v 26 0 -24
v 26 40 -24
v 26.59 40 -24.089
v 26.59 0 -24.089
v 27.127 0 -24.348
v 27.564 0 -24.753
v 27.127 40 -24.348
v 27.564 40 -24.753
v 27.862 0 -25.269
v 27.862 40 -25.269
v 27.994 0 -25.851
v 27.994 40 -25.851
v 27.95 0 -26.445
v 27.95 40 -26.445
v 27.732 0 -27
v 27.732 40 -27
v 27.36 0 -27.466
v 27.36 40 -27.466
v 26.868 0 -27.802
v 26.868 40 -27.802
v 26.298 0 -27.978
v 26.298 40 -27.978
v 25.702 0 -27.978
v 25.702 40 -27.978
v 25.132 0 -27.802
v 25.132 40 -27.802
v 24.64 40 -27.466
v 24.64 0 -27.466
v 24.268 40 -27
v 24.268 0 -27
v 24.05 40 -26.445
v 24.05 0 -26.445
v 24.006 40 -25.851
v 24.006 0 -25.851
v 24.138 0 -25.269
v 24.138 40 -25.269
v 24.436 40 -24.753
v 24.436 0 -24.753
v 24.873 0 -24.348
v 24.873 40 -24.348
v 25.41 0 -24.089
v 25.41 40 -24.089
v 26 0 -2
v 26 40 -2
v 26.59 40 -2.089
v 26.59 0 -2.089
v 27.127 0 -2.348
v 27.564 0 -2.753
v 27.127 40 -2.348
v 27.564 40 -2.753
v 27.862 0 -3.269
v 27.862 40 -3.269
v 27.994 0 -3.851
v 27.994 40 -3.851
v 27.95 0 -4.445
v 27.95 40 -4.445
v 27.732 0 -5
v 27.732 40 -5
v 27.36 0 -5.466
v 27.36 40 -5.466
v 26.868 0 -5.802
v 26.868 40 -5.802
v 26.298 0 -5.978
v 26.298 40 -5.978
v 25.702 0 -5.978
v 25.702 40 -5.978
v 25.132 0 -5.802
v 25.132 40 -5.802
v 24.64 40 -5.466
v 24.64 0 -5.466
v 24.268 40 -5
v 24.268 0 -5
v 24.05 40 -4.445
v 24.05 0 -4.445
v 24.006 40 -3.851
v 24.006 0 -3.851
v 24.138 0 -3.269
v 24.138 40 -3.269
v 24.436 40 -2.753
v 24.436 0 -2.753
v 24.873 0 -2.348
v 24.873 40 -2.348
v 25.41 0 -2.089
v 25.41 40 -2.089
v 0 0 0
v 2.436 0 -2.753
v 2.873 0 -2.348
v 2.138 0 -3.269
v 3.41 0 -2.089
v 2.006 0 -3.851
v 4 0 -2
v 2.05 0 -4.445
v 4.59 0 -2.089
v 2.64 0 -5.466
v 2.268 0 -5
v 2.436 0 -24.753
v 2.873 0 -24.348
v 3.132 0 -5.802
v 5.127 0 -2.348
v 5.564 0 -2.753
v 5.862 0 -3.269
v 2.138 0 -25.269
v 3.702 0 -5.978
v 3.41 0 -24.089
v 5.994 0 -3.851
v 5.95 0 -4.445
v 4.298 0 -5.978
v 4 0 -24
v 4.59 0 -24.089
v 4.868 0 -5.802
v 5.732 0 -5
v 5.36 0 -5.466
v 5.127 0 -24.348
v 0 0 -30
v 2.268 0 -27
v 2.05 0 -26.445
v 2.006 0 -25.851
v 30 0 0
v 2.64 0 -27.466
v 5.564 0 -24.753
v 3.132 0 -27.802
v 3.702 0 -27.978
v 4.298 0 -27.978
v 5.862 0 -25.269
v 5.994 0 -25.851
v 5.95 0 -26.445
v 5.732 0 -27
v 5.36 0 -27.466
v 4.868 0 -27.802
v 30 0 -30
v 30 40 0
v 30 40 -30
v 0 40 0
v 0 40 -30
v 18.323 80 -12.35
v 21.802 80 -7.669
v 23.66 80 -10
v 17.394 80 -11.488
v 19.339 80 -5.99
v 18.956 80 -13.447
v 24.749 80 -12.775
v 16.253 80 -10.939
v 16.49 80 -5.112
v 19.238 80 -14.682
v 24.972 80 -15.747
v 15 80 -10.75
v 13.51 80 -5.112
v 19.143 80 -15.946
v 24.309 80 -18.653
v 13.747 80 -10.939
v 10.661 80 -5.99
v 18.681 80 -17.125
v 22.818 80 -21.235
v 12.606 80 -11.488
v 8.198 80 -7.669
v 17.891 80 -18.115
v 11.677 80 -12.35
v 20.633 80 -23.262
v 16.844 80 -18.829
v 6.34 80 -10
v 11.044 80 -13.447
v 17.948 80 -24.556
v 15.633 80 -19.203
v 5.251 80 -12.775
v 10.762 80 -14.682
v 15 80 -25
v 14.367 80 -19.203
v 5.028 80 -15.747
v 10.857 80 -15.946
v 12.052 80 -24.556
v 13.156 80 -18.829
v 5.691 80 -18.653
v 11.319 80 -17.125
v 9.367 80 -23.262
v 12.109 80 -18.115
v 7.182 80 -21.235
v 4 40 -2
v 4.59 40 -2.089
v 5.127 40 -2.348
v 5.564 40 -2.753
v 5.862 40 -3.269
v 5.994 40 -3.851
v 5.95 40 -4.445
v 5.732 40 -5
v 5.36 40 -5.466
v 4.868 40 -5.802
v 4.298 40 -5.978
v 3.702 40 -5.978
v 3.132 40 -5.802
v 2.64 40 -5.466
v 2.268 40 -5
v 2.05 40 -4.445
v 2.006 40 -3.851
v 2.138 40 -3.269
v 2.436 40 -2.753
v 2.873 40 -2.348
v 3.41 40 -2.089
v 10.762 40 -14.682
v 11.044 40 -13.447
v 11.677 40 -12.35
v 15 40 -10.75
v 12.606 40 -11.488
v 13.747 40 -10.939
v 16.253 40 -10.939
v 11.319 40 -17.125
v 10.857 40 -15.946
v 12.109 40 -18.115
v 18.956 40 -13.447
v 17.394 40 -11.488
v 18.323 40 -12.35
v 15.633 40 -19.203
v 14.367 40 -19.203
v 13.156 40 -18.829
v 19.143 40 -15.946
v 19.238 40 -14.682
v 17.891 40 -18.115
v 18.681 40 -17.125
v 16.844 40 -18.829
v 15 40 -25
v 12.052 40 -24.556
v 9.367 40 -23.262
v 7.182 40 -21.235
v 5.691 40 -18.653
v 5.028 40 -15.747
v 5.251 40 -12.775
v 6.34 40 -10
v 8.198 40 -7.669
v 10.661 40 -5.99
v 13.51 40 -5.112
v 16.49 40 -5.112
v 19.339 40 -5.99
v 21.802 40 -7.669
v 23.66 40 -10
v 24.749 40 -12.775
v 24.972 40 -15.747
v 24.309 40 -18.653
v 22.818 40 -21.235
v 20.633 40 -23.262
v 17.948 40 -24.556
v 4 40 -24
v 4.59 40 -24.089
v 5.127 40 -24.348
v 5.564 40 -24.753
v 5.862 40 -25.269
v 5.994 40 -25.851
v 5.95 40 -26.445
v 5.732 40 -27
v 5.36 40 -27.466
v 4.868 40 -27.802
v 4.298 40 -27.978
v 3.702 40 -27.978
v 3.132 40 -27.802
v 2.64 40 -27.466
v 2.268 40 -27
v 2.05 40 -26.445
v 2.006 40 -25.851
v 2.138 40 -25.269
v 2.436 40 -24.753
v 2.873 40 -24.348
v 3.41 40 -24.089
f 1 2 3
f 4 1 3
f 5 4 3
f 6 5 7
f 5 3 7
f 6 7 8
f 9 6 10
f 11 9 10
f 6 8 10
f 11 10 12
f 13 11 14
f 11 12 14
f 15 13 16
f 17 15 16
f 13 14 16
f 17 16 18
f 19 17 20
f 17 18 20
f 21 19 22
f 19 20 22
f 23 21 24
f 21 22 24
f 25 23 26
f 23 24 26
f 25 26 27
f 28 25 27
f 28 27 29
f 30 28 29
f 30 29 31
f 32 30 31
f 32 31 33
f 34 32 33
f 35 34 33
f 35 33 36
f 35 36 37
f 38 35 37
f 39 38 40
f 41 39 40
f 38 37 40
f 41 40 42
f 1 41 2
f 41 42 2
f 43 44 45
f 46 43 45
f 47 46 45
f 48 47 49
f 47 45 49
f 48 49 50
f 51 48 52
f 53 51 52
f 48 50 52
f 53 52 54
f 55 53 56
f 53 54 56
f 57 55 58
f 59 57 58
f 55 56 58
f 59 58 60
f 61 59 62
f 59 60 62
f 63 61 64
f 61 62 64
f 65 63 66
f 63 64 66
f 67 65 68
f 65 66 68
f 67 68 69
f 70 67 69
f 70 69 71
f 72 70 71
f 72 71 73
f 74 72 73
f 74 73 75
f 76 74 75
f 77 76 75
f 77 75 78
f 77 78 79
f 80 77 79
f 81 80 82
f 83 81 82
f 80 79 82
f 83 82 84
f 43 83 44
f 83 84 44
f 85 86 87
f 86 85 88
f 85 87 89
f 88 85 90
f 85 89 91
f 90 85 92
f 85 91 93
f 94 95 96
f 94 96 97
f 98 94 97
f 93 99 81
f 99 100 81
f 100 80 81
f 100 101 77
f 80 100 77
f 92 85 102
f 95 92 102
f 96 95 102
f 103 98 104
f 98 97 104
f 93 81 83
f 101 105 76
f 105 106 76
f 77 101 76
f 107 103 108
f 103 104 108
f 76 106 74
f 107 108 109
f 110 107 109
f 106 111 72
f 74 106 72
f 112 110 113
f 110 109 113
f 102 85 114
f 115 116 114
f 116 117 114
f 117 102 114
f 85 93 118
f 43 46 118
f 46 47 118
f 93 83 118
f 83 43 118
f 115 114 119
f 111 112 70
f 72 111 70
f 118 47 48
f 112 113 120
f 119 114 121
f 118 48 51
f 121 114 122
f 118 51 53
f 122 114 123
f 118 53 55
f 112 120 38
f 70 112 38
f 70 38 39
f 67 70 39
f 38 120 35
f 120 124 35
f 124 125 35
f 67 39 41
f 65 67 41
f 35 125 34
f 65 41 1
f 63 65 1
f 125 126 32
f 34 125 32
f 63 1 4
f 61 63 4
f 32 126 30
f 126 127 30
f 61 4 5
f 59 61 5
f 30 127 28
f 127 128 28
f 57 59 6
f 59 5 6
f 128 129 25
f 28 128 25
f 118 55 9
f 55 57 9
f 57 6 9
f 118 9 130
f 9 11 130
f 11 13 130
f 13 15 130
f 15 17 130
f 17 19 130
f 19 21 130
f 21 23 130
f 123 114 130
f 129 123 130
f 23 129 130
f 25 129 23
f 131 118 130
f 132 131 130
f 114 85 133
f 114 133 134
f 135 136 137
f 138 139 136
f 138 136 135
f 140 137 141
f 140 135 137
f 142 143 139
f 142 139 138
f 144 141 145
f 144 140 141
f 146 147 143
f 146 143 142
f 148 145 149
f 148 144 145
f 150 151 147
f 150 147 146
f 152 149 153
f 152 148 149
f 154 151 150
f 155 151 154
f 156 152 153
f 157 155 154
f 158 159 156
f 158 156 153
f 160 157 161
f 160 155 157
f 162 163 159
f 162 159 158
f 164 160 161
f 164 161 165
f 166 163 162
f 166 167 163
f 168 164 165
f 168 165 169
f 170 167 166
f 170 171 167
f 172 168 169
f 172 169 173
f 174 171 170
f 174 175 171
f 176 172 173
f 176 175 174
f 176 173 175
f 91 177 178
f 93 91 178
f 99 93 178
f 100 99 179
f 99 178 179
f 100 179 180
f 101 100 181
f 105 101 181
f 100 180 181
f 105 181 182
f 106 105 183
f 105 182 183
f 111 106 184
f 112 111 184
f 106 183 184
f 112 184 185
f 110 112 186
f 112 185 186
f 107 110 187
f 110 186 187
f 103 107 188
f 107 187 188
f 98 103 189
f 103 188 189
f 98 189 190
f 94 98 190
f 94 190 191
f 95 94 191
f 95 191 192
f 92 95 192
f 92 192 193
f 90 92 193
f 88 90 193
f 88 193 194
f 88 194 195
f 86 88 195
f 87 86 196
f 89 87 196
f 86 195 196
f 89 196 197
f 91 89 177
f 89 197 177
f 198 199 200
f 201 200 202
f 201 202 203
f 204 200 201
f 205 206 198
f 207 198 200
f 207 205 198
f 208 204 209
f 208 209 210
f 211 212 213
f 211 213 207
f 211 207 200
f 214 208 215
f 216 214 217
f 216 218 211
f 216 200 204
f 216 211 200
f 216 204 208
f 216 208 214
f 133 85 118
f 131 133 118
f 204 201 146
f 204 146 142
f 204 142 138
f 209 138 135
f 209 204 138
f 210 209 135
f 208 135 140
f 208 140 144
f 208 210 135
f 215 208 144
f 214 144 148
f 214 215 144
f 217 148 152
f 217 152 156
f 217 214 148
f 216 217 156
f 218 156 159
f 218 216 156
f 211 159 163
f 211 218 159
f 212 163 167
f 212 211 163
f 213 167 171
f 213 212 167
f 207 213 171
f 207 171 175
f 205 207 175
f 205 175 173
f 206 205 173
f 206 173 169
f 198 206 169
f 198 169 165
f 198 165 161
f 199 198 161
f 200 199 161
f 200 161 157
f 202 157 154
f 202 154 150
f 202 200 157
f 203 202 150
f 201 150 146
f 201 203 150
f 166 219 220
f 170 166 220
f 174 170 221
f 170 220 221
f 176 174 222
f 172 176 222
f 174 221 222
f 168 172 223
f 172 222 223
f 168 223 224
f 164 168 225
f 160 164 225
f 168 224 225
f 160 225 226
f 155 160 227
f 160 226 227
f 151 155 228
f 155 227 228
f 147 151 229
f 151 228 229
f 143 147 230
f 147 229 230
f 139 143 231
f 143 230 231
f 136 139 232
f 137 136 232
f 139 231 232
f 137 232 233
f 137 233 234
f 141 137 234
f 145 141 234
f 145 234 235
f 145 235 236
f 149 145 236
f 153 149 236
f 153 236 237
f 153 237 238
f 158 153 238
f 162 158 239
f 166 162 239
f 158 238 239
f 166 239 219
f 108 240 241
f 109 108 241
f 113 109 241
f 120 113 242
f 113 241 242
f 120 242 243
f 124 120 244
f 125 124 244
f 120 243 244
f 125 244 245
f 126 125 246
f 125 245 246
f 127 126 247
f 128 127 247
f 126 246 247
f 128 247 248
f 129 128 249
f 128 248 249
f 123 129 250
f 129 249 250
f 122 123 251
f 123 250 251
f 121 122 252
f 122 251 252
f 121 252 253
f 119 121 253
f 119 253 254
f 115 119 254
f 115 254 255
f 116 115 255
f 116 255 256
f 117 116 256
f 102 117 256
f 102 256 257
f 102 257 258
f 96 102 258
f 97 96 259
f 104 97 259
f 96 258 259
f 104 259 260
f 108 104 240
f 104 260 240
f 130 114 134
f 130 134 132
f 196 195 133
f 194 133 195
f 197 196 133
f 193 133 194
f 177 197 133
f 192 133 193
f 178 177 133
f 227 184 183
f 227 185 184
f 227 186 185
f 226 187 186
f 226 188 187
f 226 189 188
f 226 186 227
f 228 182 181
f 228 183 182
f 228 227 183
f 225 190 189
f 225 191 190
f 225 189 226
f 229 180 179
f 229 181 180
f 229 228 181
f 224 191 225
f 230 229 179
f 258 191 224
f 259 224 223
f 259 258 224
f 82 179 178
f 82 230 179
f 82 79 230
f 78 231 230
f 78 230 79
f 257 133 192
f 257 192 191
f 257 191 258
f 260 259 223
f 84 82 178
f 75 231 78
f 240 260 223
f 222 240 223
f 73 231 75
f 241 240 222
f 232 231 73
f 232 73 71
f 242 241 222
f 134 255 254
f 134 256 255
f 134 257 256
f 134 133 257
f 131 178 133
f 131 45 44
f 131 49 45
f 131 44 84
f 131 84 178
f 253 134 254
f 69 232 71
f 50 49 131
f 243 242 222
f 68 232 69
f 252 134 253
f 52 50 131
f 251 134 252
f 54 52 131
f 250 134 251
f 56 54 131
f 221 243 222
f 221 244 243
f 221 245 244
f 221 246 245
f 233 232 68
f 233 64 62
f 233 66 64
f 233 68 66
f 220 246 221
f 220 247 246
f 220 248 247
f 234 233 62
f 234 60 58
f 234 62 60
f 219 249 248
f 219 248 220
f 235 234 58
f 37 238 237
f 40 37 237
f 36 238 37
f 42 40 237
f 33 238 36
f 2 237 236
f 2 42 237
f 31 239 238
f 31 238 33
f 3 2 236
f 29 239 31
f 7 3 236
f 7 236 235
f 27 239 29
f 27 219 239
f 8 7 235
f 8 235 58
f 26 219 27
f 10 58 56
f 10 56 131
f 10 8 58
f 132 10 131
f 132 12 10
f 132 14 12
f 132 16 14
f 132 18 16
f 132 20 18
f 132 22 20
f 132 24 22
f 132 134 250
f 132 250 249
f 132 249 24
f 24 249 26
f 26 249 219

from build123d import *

# Parameters (mm, degrees)
IZIM1_W                     = 30
IZIM1_H                     = 30
Y_KSEKLIK_EKSTR_ZYON1_DEPTH = 40
IZIM2_R                     = 2
KES_EKSTR_ZYON1_DEPTH       = 40
IZIM3_R                     = 10
IZIM3_R_2                   = 4.25
Y_KSEKLIK_EKSTR_ZYON2_DEPTH = 40


with BuildPart() as part:
    # Çizim1 → Yükseklik-Ekstrüzyon1 (new body)
    with BuildSketch(Plane(origin=(0, 0, 0), x_dir=(1, 0, 0), z_dir=(0, 1, 0))):
        with Locations((15, 15)):
            Rectangle(IZIM1_W, IZIM1_H)
    extrude(amount=Y_KSEKLIK_EKSTR_ZYON1_DEPTH)

    # Çizim2 → Kes-Ekstrüzyon1 (cut)
    with BuildSketch(Plane(origin=(0, 40, 0), x_dir=(1, 0, 0), z_dir=(0, 1, 0))):
        with Locations(Location((4, 26, 0), (0, 0, 270))):
            Circle(IZIM2_R)
        with Locations(Location((26, 26, 0), (0, 0, 270))):
            Circle(IZIM2_R)
        with Locations(Location((26, 4, 0), (0, 0, 270))):
            Circle(IZIM2_R)
        with Locations(Location((4, 4, 0), (0, 0, 270))):
            Circle(IZIM2_R)
    extrude(amount=-KES_EKSTR_ZYON1_DEPTH, mode=Mode.SUBTRACT)

    # Çizim3 → Yükseklik-Ekstrüzyon2 (add)
    with BuildSketch(Plane(origin=(0, 40, 0), x_dir=(1, 0, 0), z_dir=(0, 1, 0))):
        with Locations(Location((15, 15, 0), (0, 0, 90))):
            Circle(IZIM3_R)
        with Locations(Location((15, 15, 0), (0, 0, 270))):
            Circle(IZIM3_R_2, mode=Mode.SUBTRACT)
    extrude(amount=Y_KSEKLIK_EKSTR_ZYON2_DEPTH)


solid = part.part
